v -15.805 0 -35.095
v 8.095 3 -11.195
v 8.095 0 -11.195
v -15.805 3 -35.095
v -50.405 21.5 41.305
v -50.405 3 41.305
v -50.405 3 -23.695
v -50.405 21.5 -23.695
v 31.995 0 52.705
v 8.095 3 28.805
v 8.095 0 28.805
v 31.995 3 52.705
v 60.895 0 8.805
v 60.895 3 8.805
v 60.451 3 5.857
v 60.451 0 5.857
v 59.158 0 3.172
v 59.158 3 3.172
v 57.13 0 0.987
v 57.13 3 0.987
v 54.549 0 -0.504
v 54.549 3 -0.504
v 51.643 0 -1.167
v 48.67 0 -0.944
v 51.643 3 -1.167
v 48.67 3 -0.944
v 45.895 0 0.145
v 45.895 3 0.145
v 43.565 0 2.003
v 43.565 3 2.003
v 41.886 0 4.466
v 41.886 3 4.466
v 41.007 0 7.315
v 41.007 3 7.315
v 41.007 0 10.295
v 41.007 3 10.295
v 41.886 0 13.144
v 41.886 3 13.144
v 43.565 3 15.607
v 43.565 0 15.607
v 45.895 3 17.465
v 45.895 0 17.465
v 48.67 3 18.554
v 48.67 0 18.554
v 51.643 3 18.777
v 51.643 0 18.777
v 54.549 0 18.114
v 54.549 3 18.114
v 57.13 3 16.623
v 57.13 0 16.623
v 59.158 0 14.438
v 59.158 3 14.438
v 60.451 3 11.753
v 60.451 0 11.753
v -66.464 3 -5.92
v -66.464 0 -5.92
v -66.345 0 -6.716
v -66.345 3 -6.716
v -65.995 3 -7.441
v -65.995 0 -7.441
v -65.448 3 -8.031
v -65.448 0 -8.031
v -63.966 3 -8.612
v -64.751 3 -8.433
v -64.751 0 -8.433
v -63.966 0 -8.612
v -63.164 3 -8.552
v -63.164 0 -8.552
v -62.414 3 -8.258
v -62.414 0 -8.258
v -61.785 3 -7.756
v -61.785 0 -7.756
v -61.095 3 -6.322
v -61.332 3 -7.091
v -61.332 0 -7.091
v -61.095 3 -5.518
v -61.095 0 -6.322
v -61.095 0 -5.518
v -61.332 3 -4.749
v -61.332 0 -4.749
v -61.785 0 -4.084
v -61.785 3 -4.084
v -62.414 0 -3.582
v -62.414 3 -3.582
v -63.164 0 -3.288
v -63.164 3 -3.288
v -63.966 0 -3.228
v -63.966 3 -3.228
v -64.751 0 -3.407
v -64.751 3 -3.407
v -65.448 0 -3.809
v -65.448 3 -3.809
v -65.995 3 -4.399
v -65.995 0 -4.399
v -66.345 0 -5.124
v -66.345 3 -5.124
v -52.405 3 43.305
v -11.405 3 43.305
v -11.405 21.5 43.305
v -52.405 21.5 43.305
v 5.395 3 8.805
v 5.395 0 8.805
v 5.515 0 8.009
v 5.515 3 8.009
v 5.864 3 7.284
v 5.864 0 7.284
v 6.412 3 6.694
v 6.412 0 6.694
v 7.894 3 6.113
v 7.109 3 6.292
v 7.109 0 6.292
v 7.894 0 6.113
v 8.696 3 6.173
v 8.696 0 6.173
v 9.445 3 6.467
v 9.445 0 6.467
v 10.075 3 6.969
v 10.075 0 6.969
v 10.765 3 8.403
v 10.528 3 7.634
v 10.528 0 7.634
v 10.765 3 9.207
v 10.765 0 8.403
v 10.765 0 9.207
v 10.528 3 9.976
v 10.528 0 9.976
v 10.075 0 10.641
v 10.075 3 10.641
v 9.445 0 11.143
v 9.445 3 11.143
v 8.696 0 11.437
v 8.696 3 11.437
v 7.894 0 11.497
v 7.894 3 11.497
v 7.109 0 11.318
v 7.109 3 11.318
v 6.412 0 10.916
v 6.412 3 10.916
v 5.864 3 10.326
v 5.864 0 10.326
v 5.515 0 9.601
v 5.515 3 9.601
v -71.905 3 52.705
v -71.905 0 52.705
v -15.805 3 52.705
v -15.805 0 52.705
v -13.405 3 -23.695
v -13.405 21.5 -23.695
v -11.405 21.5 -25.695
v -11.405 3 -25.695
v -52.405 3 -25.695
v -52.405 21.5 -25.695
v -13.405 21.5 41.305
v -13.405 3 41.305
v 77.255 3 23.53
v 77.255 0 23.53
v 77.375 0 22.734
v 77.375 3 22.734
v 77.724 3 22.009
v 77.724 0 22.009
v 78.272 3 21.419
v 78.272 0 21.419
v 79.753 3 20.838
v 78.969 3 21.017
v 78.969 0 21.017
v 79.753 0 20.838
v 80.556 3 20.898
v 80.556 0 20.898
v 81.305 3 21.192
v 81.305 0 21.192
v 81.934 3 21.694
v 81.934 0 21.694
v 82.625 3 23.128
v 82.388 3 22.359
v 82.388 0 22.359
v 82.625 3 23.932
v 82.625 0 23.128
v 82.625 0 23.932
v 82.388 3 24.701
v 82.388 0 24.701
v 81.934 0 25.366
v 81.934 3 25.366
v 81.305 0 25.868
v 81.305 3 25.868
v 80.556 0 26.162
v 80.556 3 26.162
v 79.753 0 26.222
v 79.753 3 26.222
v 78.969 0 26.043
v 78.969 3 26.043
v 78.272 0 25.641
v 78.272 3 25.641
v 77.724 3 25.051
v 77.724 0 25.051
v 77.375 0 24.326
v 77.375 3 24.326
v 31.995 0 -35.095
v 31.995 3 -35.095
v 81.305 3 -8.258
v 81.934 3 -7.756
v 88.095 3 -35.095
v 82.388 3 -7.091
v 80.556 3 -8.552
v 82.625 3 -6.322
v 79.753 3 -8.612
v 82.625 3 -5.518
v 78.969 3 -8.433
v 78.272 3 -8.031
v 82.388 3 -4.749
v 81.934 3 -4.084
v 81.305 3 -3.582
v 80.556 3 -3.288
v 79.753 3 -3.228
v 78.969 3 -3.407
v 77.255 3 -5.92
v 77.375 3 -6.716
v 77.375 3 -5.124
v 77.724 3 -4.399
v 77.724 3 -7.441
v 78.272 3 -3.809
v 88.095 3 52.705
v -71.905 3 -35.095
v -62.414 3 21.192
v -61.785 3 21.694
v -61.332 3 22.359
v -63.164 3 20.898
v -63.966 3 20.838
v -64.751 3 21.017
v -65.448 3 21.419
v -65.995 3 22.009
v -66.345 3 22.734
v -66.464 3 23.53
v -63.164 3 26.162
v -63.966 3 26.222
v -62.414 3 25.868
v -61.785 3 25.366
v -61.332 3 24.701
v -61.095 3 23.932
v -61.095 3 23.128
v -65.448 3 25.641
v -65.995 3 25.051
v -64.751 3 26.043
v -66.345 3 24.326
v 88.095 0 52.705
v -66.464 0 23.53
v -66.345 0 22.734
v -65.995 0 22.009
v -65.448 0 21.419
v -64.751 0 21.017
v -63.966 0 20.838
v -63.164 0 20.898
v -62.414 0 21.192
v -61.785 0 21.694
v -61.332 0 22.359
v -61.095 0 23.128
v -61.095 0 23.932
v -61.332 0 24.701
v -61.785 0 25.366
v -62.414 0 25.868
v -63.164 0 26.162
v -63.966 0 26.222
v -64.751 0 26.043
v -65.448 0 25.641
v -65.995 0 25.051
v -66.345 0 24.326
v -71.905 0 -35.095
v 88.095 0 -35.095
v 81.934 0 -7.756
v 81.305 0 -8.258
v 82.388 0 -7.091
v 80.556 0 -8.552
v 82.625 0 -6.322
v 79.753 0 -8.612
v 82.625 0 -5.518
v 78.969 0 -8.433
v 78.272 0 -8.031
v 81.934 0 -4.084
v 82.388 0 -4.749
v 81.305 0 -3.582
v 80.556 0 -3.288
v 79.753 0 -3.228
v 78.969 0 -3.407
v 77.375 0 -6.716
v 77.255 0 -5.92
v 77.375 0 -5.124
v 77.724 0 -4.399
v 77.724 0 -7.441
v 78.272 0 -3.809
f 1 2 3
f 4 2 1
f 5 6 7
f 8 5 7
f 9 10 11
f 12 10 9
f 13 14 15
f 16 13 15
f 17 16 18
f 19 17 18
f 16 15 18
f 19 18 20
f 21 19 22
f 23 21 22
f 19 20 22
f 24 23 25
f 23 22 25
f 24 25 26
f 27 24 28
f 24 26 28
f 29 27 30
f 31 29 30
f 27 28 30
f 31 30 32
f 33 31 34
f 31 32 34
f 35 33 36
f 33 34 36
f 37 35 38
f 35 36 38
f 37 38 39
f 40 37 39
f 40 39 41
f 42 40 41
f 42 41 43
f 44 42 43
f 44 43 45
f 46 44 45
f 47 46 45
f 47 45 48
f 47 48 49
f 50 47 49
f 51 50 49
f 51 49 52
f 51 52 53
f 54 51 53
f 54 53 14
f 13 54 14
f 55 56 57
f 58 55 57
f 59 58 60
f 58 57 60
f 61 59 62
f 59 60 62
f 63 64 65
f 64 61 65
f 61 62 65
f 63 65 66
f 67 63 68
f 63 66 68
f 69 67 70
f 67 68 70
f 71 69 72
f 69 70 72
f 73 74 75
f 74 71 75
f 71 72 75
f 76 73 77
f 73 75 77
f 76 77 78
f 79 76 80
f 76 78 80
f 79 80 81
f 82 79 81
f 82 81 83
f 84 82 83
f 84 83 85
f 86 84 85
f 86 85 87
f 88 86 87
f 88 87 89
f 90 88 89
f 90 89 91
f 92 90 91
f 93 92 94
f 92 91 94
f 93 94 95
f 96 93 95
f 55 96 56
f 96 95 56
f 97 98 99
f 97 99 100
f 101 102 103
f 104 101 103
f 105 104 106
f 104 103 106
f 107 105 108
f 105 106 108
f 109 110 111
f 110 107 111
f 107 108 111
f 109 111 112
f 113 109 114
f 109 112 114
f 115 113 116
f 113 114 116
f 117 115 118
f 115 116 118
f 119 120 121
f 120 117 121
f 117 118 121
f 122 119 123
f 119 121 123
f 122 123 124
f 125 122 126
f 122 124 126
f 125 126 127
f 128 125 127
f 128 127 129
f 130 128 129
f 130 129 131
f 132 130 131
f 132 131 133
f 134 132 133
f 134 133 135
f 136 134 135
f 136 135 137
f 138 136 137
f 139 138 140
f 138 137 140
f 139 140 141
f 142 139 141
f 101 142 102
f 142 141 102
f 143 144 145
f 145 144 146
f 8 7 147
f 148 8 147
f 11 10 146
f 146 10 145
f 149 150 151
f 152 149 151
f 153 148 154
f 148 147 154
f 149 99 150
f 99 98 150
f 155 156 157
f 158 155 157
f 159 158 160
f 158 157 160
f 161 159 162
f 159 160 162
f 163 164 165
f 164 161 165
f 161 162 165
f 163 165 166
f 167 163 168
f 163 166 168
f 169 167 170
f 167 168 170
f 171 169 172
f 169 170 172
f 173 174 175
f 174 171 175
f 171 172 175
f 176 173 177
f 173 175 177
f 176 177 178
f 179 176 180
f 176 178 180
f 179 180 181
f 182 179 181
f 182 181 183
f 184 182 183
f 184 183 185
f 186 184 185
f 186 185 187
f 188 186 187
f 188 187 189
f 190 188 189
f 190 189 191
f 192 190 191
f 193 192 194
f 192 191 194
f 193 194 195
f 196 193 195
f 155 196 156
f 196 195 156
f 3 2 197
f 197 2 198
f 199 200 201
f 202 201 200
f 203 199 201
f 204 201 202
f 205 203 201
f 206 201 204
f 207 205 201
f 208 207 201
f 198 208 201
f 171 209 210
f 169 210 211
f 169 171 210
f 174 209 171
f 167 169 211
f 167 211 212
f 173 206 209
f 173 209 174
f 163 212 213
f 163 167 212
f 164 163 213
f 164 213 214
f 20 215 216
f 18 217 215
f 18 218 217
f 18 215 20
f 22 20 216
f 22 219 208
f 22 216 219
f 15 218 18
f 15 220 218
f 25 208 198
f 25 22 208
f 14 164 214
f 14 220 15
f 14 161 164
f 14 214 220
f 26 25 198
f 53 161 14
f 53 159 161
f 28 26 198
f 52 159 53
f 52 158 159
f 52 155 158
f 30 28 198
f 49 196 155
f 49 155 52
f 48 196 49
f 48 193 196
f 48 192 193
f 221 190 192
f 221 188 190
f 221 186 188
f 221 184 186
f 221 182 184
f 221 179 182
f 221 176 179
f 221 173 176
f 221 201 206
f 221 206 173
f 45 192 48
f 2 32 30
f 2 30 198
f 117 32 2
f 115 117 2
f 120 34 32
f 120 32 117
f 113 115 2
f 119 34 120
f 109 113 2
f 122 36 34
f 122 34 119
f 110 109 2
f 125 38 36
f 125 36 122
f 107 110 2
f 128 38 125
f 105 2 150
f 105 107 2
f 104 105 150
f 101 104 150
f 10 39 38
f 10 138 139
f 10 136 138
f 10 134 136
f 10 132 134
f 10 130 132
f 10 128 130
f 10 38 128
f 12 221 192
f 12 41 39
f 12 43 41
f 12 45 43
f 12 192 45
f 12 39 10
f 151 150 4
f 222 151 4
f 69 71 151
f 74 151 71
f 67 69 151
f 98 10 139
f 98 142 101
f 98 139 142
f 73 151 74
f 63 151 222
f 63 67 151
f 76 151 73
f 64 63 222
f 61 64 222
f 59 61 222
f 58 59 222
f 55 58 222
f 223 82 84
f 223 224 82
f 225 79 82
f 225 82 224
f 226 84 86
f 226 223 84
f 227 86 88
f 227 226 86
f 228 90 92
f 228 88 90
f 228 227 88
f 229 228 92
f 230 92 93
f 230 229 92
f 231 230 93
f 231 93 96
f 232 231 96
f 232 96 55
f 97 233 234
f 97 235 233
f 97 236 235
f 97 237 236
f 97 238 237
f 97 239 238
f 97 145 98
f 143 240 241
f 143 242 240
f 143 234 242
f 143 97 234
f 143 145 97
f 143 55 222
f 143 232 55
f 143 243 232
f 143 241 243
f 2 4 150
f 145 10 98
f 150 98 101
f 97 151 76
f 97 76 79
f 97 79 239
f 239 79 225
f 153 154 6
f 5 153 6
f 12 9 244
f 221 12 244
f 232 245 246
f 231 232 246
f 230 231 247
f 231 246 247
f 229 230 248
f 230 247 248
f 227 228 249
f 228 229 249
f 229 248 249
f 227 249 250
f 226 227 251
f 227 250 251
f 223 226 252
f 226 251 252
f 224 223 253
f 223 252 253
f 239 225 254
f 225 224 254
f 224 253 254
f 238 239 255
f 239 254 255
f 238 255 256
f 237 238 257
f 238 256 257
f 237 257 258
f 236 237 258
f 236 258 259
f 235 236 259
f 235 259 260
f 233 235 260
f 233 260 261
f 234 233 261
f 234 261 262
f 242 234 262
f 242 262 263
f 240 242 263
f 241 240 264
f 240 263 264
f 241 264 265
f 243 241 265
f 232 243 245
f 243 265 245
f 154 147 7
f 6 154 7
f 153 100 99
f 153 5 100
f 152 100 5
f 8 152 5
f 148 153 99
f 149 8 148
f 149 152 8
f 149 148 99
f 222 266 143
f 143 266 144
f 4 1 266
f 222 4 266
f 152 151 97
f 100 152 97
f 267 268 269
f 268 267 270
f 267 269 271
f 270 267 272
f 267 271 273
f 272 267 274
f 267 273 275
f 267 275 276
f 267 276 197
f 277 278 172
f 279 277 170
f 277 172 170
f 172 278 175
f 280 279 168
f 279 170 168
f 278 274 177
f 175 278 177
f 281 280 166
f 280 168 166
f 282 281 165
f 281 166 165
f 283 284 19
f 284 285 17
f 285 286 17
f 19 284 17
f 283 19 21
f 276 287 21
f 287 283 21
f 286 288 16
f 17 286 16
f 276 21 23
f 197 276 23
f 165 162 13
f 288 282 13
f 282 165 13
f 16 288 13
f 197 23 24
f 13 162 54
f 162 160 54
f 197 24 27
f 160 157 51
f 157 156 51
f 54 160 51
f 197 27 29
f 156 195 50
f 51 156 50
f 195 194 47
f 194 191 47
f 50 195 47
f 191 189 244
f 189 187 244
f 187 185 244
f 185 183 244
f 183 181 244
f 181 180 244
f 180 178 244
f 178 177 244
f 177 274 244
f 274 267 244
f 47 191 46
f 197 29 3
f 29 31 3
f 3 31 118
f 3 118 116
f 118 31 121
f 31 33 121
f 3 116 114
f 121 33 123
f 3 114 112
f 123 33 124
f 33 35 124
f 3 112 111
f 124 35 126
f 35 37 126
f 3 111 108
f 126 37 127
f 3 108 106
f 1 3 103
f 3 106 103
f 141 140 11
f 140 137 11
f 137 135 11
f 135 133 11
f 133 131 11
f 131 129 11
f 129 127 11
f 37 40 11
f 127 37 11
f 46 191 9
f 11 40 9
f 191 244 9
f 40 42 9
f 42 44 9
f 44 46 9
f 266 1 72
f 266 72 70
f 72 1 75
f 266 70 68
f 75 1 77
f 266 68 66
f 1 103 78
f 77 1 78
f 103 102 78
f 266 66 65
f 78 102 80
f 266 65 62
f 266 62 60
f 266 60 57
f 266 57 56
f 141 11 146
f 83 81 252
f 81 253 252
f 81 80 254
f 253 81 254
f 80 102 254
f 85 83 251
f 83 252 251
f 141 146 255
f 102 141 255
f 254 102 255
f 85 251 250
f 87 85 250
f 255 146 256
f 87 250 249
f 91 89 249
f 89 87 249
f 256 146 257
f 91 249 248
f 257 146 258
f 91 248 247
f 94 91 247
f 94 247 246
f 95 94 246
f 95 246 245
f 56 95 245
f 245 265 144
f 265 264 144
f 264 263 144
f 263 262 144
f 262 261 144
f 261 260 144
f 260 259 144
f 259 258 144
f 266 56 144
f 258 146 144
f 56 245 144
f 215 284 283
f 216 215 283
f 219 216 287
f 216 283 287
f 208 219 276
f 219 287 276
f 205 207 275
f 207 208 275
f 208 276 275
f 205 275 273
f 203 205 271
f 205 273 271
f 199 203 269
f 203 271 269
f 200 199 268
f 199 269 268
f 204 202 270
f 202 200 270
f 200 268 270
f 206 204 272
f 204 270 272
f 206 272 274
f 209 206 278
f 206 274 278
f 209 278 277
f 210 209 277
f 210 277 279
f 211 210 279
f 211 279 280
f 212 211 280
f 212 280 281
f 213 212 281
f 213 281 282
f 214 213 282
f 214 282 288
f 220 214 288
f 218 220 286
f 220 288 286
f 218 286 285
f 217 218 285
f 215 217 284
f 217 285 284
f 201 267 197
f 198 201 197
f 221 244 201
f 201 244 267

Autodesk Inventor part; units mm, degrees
ref_plane "YZ Plane" through (0, 0, 0) normal (1, 0, 0) x (0, 1, 0)
ref_plane "XZ Plane" through (0, 0, 0) normal (0, 1, 0) x (-1, 0, 0)
ref_plane "XY Plane" through (0, 0, 0) normal (0, 0, 1) x (1, 0, 0)
sketch "Sketch1" plane through (0, 0, 0) normal (0, 1, 0) x (-1, 0, 0)
  line L0 (-88.0953, -35.095) -> (-78.6953, -35.095)
  line L1 (62.5047, 52.705) -> (71.9047, 52.705)
  line L2 (-88.0953, -35.095) -> (71.9047, -35.095)
  line L3 (71.9047, -35.095) -> (71.9047, 52.705)
  line L4 (71.9047, 52.705) -> (-88.0953, 52.705)
  line L5 (-88.0953, 52.705) -> (-88.0953, -35.095)
  circle A0 centre (-79.9551, -5.92) radius 2.7
  circle A1 centre (-79.9551, -5.92) radius 2.7
  circle A2 centre (-79.9551, 23.53) radius 2.7
  circle A3 centre (-79.9551, 23.53) radius 2.7
  circle A4 centre (-8.0953, 8.805) radius 2.7
  circle A5 centre (-8.0953, 8.805) radius 2.7
  circle A6 centre (63.7645, -5.92) radius 2.7
  circle A7 centre (63.7645, -5.92) radius 2.7
  circle A8 centre (63.7645, 23.53) radius 2.7
  circle A9 centre (63.7645, 23.53) radius 2.7
  line L6 (-88.0953, -35.095) -> (71.9047, -35.095)
  line L7 (71.9047, -35.095) -> (71.9047, 52.705)
  line L8 (71.9047, 52.705) -> (-88.0953, 52.705)
  line L9 (-88.0953, 52.705) -> (-88.0953, -35.095)
  point P0 (0, 0)
  point P1 (-83.0953, -33.095)
extrude "Extrusion1" add sketch "Sketch1" along normal blind 3
sketch "Sketch2" plane through (0, 3, 0) normal (0, 1, 0) x (1, 0, 0)
  circle A0 centre (8.0953, -8.805) radius 2.7 projected
  line L0 (8.0953, -8.805) -> (8.0953, -52.705)
  line L1 (-71.9047, -52.705) -> (88.0953, -52.705) projected
  line L2 (8.0953, -8.805) -> (8.0953, 35.095)
  line L3 (88.0953, 35.095) -> (-71.9047, 35.095) projected
  line L4 (8.0953, -8.805) -> (-35.8047, -52.705)
  line L5 (8.0953, -8.805) -> (70.1793, -8.805) construction
  line L6 (8.0953, -8.805) -> (51.9953, -52.705)
  line L7 (8.0953, -8.805) -> (70.1793, -8.805) construction
  line L8 (8.0953, -8.805) -> (-18.3888, -8.805)
  line L9 (8.0953, -8.805) -> (-35.8047, 35.095)
  line L10 (8.0953, -8.805) -> (51.9953, 35.095)
  line L11 (-35.8047, -52.705) -> (51.9953, -52.705)
  line L12 (51.9953, -52.705) -> (51.9953, 35.095)
  line L13 (51.9953, 35.095) -> (-35.8047, 35.095)
  line L14 (-35.8047, 35.095) -> (-35.8047, -52.705)
  line L15 (8.0953, -8.805) -> (8.0953, -28.805)
  line L16 (8.0953, -28.805) -> (8.0953, 11.195)
  line L17 (8.0953, 11.195) -> (-15.8047, 35.095)
  line L18 (8.0953, -28.805) -> (-15.8047, -52.705)
  line L19 (8.0953, -28.805) -> (31.9953, -52.705)
  line L20 (8.0953, 11.195) -> (31.9953, 35.095)
  point P0 (0, 0)
  dimension "d2" = 135
  dimension "d3" = 45
  dimension "d4" = 20
  dimension "d5" = 40
extrude "Extrusion2" cut sketch "Sketch2" against normal blind 3 contours L17 L3 L2 | L2 L3 L20 | L19 L1 L0 | L0 L1 L18
sketch "Sketch3" plane through (0, 3, 0) normal (0, 1, 0) x (1, 0, 0)
  line L0 (-71.9047, 35.095) -> (-71.9047, -52.705) projected
  line L1 (-71.9047, -8.805) -> (-34.7047, -8.805)
  circle A0 centre (-34.7047, -8.805) radius 10
  point P0 (0, 0)
  dimension "d8" = 37.2
  dimension "d9" = 20
extrude "Extrusion3" cut sketch "Sketch3" against normal blind 3
sketch "Sketch4" plane through (0, 3, 0) normal (0, 1, 0) x (1, 0, 0)
  point P0 (0, 0)
sketch "Sketch5" plane through (0, 3, 0) normal (0, 1, 0) x (1, 0, 0)
  line L0 (-71.9047, 35.095) -> (-71.9047, -52.705) projected
  line L1 (88.0953, -52.705) -> (88.0953, 35.095) projected
  line L2 (-71.9047, -52.705) -> (88.0953, -52.705)
  line L3 (8.0953, -52.705) -> (8.0953, 35.095)
  circle A0 centre (-34.7047, -8.805) radius 10 projected
  circle A1 centre (-34.7047, -8.805) radius 10
  circle A2 centre (50.8953, -8.805) radius 10
  point P0 (0, 0)
extrude "Extrusion4" cut sketch "Sketch5" against normal blind 3 contours A2
sketch "Sketch6" plane through (0, 3, 0) normal (0, 1, 0) x (1, 0, 0)
  line L0 (-48.5025, 4.8798) -> (-18.5618, 4.8798)
  line L1 (-18.5618, 4.8798) -> (-18.5618, -20.2546)
  line L2 (-18.5618, -20.2546) -> (-48.5025, -20.2546)
  line L3 (-48.5025, -20.2546) -> (-48.5025, 4.8798)
  point P0 (0, 0)
extrude "Extrusion5" add sketch "Sketch6" against normal up to surface (3 mm away)
sketch "Sketch7" plane through (0, 3, 0) normal (0, 1, 0) x (1, 0, 0)
  line L0 (-15.8047, 35.095) -> (-71.9047, 35.095) projected
  line L1 (-71.9047, 35.095) -> (8.0953, 35.095)
  line L2 (8.0953, 35.095) -> (8.0953, -52.705)
  line L3 (8.0953, -52.705) -> (-71.9047, -52.705)
  line L4 (-71.9047, -52.705) -> (-71.9047, 35.095)
  line L5 (-71.9047, -8.805) -> (8.0953, -8.805)
  line L6 (-31.9047, -8.805) -> (-52.4047, -8.805)
  line L7 (-52.4047, -8.805) -> (-11.4047, -8.805)
  line L8 (-52.4047, -8.805) -> (-11.4047, -8.805)
  line L9 (-11.4047, -8.805) -> (-11.4047, 25.695)
  line L10 (-11.4047, 25.695) -> (-52.4047, 25.695)
  line L11 (-52.4047, 25.695) -> (-52.4047, -8.805)
  line L12 (-52.4047, 25.695) -> (-11.4047, 25.695)
  line L13 (-11.4047, 25.695) -> (-11.4047, -43.305)
  line L14 (-11.4047, -43.305) -> (-52.4047, -43.305)
  line L15 (-52.4047, -43.305) -> (-52.4047, 25.695)
  line L16 (-31.9047, -8.805) -> (-31.9047, -5.9886)
  line L17 (-31.9047, -5.9886) -> (-50.3547, -5.9886)
  line L18 (-50.3547, -5.9886) -> (-13.4547, -5.9886)
  line L19 (-50.4047, 23.695) -> (-13.4047, 23.695)
  line L20 (-13.4047, 23.695) -> (-13.4047, -41.305)
  line L21 (-13.4047, -41.305) -> (-50.4047, -41.305)
  line L22 (-50.4047, -41.305) -> (-50.4047, 23.695)
  point P0 (0, 0)
  dimension "d16" = 20.5
  dimension "d17" = 41
  dimension "d18" = 34.5
  dimension "d19" = 69
  dimension "d20" = 18.45
  dimension "d21" = 36.9
  dimension "d22" = 2
extrude "Extrusion6" add sketch "Sketch7" along normal blind 18.5 contours L11 L10 L9 L5 L20 L19 L22 | L5 L22 L21 L20 L13 L14 L15
properties part number "SCHOOL PROJECT TOP"
